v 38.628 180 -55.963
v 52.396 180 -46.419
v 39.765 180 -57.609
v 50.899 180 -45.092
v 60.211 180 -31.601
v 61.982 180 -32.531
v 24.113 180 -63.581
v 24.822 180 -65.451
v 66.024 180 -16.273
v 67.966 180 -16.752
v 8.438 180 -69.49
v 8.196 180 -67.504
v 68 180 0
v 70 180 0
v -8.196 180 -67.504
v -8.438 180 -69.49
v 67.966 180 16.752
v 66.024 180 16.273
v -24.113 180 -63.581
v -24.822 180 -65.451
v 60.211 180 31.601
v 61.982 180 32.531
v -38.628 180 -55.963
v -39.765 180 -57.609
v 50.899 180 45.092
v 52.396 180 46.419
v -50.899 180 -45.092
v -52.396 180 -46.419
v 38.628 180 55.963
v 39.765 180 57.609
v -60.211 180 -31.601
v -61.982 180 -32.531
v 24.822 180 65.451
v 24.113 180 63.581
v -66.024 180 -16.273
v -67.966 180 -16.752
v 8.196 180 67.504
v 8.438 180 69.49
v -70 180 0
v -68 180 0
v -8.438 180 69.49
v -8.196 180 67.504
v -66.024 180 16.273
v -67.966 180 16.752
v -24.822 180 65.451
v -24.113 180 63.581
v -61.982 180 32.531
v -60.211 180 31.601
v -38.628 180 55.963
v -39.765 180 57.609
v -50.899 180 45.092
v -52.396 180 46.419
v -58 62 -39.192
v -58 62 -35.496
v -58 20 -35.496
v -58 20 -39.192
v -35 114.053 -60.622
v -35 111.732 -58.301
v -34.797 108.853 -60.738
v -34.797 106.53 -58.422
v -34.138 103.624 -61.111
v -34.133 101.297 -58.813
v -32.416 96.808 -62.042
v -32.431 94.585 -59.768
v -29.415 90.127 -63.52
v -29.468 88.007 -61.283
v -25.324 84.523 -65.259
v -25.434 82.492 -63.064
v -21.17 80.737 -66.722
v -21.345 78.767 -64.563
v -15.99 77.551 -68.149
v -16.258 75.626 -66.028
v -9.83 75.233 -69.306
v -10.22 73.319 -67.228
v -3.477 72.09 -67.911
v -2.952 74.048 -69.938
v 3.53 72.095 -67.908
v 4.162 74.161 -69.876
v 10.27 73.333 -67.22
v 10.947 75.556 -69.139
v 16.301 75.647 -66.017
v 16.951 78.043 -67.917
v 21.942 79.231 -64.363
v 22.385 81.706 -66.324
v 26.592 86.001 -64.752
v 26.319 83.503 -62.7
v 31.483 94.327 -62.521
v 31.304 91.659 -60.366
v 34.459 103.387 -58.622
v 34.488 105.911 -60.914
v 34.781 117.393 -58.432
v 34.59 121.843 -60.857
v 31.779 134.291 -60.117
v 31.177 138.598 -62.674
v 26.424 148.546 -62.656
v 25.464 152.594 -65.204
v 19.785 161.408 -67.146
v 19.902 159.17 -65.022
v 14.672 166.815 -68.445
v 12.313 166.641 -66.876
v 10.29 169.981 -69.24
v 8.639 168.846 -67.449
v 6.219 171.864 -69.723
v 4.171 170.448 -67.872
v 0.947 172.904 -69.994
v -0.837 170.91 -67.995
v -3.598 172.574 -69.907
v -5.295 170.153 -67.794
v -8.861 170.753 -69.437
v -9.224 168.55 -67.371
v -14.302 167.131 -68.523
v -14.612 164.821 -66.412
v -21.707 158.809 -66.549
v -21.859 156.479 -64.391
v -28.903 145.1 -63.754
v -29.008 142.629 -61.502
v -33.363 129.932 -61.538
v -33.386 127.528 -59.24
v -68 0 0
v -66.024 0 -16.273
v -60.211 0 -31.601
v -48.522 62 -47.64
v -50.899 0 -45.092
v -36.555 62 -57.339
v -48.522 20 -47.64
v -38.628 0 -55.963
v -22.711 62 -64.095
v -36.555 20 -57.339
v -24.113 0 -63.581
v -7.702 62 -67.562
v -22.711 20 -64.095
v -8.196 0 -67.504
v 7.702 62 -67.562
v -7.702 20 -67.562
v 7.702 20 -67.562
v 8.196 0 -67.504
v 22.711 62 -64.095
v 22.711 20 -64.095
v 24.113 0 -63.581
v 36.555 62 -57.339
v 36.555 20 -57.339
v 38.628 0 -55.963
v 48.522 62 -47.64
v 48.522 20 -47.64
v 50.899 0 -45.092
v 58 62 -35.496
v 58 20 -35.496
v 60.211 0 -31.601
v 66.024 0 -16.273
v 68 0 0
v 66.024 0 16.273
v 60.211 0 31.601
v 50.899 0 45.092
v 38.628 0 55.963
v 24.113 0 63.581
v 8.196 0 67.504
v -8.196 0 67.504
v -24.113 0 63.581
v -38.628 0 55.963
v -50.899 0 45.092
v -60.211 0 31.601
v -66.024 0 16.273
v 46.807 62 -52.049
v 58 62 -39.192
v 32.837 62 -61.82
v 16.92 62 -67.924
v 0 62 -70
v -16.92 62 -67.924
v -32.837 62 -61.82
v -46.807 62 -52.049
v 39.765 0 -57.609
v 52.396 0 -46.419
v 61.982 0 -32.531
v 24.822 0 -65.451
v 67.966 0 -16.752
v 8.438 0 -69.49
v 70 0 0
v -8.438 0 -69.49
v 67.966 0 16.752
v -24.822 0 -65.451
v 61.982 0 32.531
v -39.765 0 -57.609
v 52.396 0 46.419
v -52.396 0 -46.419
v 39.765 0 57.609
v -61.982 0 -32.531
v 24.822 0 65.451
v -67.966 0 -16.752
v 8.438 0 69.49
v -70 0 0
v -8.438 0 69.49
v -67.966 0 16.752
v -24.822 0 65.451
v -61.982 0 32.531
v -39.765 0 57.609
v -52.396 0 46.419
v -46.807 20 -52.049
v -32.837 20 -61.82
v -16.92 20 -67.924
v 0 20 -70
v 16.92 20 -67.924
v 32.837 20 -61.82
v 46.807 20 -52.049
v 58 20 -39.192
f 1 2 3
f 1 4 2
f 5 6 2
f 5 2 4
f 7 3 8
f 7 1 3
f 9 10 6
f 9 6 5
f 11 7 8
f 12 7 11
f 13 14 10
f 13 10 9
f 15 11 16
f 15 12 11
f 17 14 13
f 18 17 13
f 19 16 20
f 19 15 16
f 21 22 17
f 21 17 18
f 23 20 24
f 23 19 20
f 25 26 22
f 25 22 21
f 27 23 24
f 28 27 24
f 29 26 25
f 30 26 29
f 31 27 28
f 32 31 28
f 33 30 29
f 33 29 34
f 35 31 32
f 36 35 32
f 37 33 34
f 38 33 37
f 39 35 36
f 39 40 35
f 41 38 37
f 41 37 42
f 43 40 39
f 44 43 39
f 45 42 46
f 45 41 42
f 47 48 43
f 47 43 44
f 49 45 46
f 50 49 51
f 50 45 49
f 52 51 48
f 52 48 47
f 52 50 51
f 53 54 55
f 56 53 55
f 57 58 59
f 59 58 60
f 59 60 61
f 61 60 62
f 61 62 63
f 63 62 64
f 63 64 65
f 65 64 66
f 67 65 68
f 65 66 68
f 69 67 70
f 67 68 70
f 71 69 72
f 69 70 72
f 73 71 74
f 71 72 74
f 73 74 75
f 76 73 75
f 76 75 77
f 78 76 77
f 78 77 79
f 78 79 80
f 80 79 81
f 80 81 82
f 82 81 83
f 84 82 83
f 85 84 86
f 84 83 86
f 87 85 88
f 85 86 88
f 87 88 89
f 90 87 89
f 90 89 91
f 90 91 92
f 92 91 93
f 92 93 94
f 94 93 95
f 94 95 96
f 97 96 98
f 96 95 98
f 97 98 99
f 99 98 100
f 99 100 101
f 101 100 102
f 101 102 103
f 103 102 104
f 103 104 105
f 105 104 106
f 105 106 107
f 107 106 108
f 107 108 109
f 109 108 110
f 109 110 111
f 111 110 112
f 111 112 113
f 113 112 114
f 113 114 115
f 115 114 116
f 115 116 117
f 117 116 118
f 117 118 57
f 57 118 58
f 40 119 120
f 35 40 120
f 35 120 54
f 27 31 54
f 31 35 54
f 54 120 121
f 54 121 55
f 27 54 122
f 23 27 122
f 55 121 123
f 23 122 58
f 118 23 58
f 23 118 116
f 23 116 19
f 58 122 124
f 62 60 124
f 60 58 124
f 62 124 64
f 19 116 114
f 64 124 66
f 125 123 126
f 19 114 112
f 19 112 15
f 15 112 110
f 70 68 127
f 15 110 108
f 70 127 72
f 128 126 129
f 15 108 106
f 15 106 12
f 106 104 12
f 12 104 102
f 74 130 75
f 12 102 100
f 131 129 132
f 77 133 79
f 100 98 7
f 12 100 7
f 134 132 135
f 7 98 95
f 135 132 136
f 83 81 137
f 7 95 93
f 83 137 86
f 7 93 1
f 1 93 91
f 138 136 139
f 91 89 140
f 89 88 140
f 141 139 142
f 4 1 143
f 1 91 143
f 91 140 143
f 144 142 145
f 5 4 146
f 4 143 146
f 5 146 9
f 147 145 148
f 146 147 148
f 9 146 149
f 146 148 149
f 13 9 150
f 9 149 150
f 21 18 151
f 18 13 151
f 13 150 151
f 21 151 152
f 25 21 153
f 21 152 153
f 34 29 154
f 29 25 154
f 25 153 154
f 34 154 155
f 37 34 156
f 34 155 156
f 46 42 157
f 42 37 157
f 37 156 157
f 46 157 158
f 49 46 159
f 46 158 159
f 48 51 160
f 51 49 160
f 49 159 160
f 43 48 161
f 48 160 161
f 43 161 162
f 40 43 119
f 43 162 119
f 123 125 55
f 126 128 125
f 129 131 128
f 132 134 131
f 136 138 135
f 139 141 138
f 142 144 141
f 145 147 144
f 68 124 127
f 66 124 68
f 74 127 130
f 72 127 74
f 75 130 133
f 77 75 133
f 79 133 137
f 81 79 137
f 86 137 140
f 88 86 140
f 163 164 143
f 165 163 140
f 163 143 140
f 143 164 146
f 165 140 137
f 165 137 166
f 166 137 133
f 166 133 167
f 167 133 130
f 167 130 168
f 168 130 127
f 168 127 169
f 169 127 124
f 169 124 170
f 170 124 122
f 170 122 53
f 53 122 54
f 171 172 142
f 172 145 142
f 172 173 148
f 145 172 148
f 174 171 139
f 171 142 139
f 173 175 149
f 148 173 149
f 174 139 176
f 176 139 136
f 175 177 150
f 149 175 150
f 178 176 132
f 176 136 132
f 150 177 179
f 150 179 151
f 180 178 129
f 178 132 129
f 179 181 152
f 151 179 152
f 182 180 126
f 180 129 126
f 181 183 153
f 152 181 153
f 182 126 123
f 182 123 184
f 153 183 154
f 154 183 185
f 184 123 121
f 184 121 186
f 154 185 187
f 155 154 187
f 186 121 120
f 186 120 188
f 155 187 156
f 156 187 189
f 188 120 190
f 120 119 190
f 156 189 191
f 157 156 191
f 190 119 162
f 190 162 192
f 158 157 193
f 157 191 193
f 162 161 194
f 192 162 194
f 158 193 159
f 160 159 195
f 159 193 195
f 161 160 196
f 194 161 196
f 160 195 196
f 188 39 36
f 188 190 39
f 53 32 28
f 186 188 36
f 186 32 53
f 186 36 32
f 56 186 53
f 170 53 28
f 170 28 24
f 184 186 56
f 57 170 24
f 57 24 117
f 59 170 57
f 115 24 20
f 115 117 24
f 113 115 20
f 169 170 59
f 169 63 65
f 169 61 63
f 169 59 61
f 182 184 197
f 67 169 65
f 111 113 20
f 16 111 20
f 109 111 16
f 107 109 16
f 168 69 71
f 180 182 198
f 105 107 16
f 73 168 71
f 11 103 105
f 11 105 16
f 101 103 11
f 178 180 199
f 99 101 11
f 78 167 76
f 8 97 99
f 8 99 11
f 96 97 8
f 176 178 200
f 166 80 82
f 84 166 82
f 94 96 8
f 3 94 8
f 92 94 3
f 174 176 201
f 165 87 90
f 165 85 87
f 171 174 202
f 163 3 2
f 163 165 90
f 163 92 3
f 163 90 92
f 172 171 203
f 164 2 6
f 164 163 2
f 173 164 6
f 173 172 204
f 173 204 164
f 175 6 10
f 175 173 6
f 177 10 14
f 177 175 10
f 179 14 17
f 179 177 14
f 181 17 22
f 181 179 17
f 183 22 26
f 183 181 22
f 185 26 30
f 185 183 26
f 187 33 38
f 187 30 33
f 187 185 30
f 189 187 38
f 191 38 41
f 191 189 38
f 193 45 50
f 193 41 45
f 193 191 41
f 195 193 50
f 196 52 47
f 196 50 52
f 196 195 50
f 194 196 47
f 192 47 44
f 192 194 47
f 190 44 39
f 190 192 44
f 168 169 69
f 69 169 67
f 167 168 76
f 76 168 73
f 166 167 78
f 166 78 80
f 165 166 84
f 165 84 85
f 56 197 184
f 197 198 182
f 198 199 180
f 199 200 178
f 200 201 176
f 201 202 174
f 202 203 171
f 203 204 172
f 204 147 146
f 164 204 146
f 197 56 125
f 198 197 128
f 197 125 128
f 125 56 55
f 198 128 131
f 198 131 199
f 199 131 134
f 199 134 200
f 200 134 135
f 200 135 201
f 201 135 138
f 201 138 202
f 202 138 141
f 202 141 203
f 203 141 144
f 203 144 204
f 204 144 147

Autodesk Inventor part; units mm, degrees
ref_plane "YZ Plane" through (0, 0, 0) normal (1, 0, 0) x (0, 1, 0)
ref_plane "XZ Plane" through (0, 0, 0) normal (0, 1, 0) x (-1, 0, 0)
sketch "Sketch1" plane through (0, 0, 0) normal (0, 1, 0) x (-1, 0, 0)
  circle A0 centre (0, 0) radius 68
  circle A1 centre (0, 0) radius 70
  dimension "d0" = 2
  dimension "d1" = 140
extrude "Extrusion1" add sketch "Sketch1" along normal blind 180
sketch "Sketch2" plane through (0, 0, 0) normal (0, 0, 1) x (1, 0, 0)
  line L0 (-58, 20) -> (58, 20)
  line L1 (58, 20) -> (58, 62)
  line L2 (58, 62) -> (-58, 62)
  line L3 (-58, 62) -> (-58, 20)
  line L4 (70, 0) -> (-70, 0) projected
  point P0 (0, 0)
  point P1 (0, 0)
  dimension "d4" = 42
  dimension "d5" = 116
  dimension "d6" = 20
  dimension "d7" = 58
extrude "Extrusion2" cut sketch "Sketch2" against normal through all
sketch "Sketch3" plane through (0, 0, 0) normal (0, 0, 1) x (1, 0, 0)
  line L0 (32.7477, 110) -> (-36.5, 110)
  line L1 (70, 0) -> (-70, 0) projected
  point P0 (0, 0)
  point P1 (-1.8762, 110)
  dimension "d12" = 110
ref_plane "Work Plane1" through (32.7477, 110, 0) normal (0, 0.7071, -0.7071) x (-1, 0, 0)
sketch "Sketch4" plane through (32.7477, 110, 0) normal (0, 0.7071, -0.7071) x (-1, 0, 0)
  circle A0 centre (32.7477, -40) radius 35
  line L0 (0, 0) -> (69.2476, 0) projected
  point P0 (32.7477, -77.7817)
  point P1 (34.6238, 0)
  point P2 (34.6238, 0)
  dimension "d11" = 70
  dimension "d15" = 40
extrude "Extrusion3" cut sketch "Sketch4" along normal through all
properties part number "Outer shaft"
